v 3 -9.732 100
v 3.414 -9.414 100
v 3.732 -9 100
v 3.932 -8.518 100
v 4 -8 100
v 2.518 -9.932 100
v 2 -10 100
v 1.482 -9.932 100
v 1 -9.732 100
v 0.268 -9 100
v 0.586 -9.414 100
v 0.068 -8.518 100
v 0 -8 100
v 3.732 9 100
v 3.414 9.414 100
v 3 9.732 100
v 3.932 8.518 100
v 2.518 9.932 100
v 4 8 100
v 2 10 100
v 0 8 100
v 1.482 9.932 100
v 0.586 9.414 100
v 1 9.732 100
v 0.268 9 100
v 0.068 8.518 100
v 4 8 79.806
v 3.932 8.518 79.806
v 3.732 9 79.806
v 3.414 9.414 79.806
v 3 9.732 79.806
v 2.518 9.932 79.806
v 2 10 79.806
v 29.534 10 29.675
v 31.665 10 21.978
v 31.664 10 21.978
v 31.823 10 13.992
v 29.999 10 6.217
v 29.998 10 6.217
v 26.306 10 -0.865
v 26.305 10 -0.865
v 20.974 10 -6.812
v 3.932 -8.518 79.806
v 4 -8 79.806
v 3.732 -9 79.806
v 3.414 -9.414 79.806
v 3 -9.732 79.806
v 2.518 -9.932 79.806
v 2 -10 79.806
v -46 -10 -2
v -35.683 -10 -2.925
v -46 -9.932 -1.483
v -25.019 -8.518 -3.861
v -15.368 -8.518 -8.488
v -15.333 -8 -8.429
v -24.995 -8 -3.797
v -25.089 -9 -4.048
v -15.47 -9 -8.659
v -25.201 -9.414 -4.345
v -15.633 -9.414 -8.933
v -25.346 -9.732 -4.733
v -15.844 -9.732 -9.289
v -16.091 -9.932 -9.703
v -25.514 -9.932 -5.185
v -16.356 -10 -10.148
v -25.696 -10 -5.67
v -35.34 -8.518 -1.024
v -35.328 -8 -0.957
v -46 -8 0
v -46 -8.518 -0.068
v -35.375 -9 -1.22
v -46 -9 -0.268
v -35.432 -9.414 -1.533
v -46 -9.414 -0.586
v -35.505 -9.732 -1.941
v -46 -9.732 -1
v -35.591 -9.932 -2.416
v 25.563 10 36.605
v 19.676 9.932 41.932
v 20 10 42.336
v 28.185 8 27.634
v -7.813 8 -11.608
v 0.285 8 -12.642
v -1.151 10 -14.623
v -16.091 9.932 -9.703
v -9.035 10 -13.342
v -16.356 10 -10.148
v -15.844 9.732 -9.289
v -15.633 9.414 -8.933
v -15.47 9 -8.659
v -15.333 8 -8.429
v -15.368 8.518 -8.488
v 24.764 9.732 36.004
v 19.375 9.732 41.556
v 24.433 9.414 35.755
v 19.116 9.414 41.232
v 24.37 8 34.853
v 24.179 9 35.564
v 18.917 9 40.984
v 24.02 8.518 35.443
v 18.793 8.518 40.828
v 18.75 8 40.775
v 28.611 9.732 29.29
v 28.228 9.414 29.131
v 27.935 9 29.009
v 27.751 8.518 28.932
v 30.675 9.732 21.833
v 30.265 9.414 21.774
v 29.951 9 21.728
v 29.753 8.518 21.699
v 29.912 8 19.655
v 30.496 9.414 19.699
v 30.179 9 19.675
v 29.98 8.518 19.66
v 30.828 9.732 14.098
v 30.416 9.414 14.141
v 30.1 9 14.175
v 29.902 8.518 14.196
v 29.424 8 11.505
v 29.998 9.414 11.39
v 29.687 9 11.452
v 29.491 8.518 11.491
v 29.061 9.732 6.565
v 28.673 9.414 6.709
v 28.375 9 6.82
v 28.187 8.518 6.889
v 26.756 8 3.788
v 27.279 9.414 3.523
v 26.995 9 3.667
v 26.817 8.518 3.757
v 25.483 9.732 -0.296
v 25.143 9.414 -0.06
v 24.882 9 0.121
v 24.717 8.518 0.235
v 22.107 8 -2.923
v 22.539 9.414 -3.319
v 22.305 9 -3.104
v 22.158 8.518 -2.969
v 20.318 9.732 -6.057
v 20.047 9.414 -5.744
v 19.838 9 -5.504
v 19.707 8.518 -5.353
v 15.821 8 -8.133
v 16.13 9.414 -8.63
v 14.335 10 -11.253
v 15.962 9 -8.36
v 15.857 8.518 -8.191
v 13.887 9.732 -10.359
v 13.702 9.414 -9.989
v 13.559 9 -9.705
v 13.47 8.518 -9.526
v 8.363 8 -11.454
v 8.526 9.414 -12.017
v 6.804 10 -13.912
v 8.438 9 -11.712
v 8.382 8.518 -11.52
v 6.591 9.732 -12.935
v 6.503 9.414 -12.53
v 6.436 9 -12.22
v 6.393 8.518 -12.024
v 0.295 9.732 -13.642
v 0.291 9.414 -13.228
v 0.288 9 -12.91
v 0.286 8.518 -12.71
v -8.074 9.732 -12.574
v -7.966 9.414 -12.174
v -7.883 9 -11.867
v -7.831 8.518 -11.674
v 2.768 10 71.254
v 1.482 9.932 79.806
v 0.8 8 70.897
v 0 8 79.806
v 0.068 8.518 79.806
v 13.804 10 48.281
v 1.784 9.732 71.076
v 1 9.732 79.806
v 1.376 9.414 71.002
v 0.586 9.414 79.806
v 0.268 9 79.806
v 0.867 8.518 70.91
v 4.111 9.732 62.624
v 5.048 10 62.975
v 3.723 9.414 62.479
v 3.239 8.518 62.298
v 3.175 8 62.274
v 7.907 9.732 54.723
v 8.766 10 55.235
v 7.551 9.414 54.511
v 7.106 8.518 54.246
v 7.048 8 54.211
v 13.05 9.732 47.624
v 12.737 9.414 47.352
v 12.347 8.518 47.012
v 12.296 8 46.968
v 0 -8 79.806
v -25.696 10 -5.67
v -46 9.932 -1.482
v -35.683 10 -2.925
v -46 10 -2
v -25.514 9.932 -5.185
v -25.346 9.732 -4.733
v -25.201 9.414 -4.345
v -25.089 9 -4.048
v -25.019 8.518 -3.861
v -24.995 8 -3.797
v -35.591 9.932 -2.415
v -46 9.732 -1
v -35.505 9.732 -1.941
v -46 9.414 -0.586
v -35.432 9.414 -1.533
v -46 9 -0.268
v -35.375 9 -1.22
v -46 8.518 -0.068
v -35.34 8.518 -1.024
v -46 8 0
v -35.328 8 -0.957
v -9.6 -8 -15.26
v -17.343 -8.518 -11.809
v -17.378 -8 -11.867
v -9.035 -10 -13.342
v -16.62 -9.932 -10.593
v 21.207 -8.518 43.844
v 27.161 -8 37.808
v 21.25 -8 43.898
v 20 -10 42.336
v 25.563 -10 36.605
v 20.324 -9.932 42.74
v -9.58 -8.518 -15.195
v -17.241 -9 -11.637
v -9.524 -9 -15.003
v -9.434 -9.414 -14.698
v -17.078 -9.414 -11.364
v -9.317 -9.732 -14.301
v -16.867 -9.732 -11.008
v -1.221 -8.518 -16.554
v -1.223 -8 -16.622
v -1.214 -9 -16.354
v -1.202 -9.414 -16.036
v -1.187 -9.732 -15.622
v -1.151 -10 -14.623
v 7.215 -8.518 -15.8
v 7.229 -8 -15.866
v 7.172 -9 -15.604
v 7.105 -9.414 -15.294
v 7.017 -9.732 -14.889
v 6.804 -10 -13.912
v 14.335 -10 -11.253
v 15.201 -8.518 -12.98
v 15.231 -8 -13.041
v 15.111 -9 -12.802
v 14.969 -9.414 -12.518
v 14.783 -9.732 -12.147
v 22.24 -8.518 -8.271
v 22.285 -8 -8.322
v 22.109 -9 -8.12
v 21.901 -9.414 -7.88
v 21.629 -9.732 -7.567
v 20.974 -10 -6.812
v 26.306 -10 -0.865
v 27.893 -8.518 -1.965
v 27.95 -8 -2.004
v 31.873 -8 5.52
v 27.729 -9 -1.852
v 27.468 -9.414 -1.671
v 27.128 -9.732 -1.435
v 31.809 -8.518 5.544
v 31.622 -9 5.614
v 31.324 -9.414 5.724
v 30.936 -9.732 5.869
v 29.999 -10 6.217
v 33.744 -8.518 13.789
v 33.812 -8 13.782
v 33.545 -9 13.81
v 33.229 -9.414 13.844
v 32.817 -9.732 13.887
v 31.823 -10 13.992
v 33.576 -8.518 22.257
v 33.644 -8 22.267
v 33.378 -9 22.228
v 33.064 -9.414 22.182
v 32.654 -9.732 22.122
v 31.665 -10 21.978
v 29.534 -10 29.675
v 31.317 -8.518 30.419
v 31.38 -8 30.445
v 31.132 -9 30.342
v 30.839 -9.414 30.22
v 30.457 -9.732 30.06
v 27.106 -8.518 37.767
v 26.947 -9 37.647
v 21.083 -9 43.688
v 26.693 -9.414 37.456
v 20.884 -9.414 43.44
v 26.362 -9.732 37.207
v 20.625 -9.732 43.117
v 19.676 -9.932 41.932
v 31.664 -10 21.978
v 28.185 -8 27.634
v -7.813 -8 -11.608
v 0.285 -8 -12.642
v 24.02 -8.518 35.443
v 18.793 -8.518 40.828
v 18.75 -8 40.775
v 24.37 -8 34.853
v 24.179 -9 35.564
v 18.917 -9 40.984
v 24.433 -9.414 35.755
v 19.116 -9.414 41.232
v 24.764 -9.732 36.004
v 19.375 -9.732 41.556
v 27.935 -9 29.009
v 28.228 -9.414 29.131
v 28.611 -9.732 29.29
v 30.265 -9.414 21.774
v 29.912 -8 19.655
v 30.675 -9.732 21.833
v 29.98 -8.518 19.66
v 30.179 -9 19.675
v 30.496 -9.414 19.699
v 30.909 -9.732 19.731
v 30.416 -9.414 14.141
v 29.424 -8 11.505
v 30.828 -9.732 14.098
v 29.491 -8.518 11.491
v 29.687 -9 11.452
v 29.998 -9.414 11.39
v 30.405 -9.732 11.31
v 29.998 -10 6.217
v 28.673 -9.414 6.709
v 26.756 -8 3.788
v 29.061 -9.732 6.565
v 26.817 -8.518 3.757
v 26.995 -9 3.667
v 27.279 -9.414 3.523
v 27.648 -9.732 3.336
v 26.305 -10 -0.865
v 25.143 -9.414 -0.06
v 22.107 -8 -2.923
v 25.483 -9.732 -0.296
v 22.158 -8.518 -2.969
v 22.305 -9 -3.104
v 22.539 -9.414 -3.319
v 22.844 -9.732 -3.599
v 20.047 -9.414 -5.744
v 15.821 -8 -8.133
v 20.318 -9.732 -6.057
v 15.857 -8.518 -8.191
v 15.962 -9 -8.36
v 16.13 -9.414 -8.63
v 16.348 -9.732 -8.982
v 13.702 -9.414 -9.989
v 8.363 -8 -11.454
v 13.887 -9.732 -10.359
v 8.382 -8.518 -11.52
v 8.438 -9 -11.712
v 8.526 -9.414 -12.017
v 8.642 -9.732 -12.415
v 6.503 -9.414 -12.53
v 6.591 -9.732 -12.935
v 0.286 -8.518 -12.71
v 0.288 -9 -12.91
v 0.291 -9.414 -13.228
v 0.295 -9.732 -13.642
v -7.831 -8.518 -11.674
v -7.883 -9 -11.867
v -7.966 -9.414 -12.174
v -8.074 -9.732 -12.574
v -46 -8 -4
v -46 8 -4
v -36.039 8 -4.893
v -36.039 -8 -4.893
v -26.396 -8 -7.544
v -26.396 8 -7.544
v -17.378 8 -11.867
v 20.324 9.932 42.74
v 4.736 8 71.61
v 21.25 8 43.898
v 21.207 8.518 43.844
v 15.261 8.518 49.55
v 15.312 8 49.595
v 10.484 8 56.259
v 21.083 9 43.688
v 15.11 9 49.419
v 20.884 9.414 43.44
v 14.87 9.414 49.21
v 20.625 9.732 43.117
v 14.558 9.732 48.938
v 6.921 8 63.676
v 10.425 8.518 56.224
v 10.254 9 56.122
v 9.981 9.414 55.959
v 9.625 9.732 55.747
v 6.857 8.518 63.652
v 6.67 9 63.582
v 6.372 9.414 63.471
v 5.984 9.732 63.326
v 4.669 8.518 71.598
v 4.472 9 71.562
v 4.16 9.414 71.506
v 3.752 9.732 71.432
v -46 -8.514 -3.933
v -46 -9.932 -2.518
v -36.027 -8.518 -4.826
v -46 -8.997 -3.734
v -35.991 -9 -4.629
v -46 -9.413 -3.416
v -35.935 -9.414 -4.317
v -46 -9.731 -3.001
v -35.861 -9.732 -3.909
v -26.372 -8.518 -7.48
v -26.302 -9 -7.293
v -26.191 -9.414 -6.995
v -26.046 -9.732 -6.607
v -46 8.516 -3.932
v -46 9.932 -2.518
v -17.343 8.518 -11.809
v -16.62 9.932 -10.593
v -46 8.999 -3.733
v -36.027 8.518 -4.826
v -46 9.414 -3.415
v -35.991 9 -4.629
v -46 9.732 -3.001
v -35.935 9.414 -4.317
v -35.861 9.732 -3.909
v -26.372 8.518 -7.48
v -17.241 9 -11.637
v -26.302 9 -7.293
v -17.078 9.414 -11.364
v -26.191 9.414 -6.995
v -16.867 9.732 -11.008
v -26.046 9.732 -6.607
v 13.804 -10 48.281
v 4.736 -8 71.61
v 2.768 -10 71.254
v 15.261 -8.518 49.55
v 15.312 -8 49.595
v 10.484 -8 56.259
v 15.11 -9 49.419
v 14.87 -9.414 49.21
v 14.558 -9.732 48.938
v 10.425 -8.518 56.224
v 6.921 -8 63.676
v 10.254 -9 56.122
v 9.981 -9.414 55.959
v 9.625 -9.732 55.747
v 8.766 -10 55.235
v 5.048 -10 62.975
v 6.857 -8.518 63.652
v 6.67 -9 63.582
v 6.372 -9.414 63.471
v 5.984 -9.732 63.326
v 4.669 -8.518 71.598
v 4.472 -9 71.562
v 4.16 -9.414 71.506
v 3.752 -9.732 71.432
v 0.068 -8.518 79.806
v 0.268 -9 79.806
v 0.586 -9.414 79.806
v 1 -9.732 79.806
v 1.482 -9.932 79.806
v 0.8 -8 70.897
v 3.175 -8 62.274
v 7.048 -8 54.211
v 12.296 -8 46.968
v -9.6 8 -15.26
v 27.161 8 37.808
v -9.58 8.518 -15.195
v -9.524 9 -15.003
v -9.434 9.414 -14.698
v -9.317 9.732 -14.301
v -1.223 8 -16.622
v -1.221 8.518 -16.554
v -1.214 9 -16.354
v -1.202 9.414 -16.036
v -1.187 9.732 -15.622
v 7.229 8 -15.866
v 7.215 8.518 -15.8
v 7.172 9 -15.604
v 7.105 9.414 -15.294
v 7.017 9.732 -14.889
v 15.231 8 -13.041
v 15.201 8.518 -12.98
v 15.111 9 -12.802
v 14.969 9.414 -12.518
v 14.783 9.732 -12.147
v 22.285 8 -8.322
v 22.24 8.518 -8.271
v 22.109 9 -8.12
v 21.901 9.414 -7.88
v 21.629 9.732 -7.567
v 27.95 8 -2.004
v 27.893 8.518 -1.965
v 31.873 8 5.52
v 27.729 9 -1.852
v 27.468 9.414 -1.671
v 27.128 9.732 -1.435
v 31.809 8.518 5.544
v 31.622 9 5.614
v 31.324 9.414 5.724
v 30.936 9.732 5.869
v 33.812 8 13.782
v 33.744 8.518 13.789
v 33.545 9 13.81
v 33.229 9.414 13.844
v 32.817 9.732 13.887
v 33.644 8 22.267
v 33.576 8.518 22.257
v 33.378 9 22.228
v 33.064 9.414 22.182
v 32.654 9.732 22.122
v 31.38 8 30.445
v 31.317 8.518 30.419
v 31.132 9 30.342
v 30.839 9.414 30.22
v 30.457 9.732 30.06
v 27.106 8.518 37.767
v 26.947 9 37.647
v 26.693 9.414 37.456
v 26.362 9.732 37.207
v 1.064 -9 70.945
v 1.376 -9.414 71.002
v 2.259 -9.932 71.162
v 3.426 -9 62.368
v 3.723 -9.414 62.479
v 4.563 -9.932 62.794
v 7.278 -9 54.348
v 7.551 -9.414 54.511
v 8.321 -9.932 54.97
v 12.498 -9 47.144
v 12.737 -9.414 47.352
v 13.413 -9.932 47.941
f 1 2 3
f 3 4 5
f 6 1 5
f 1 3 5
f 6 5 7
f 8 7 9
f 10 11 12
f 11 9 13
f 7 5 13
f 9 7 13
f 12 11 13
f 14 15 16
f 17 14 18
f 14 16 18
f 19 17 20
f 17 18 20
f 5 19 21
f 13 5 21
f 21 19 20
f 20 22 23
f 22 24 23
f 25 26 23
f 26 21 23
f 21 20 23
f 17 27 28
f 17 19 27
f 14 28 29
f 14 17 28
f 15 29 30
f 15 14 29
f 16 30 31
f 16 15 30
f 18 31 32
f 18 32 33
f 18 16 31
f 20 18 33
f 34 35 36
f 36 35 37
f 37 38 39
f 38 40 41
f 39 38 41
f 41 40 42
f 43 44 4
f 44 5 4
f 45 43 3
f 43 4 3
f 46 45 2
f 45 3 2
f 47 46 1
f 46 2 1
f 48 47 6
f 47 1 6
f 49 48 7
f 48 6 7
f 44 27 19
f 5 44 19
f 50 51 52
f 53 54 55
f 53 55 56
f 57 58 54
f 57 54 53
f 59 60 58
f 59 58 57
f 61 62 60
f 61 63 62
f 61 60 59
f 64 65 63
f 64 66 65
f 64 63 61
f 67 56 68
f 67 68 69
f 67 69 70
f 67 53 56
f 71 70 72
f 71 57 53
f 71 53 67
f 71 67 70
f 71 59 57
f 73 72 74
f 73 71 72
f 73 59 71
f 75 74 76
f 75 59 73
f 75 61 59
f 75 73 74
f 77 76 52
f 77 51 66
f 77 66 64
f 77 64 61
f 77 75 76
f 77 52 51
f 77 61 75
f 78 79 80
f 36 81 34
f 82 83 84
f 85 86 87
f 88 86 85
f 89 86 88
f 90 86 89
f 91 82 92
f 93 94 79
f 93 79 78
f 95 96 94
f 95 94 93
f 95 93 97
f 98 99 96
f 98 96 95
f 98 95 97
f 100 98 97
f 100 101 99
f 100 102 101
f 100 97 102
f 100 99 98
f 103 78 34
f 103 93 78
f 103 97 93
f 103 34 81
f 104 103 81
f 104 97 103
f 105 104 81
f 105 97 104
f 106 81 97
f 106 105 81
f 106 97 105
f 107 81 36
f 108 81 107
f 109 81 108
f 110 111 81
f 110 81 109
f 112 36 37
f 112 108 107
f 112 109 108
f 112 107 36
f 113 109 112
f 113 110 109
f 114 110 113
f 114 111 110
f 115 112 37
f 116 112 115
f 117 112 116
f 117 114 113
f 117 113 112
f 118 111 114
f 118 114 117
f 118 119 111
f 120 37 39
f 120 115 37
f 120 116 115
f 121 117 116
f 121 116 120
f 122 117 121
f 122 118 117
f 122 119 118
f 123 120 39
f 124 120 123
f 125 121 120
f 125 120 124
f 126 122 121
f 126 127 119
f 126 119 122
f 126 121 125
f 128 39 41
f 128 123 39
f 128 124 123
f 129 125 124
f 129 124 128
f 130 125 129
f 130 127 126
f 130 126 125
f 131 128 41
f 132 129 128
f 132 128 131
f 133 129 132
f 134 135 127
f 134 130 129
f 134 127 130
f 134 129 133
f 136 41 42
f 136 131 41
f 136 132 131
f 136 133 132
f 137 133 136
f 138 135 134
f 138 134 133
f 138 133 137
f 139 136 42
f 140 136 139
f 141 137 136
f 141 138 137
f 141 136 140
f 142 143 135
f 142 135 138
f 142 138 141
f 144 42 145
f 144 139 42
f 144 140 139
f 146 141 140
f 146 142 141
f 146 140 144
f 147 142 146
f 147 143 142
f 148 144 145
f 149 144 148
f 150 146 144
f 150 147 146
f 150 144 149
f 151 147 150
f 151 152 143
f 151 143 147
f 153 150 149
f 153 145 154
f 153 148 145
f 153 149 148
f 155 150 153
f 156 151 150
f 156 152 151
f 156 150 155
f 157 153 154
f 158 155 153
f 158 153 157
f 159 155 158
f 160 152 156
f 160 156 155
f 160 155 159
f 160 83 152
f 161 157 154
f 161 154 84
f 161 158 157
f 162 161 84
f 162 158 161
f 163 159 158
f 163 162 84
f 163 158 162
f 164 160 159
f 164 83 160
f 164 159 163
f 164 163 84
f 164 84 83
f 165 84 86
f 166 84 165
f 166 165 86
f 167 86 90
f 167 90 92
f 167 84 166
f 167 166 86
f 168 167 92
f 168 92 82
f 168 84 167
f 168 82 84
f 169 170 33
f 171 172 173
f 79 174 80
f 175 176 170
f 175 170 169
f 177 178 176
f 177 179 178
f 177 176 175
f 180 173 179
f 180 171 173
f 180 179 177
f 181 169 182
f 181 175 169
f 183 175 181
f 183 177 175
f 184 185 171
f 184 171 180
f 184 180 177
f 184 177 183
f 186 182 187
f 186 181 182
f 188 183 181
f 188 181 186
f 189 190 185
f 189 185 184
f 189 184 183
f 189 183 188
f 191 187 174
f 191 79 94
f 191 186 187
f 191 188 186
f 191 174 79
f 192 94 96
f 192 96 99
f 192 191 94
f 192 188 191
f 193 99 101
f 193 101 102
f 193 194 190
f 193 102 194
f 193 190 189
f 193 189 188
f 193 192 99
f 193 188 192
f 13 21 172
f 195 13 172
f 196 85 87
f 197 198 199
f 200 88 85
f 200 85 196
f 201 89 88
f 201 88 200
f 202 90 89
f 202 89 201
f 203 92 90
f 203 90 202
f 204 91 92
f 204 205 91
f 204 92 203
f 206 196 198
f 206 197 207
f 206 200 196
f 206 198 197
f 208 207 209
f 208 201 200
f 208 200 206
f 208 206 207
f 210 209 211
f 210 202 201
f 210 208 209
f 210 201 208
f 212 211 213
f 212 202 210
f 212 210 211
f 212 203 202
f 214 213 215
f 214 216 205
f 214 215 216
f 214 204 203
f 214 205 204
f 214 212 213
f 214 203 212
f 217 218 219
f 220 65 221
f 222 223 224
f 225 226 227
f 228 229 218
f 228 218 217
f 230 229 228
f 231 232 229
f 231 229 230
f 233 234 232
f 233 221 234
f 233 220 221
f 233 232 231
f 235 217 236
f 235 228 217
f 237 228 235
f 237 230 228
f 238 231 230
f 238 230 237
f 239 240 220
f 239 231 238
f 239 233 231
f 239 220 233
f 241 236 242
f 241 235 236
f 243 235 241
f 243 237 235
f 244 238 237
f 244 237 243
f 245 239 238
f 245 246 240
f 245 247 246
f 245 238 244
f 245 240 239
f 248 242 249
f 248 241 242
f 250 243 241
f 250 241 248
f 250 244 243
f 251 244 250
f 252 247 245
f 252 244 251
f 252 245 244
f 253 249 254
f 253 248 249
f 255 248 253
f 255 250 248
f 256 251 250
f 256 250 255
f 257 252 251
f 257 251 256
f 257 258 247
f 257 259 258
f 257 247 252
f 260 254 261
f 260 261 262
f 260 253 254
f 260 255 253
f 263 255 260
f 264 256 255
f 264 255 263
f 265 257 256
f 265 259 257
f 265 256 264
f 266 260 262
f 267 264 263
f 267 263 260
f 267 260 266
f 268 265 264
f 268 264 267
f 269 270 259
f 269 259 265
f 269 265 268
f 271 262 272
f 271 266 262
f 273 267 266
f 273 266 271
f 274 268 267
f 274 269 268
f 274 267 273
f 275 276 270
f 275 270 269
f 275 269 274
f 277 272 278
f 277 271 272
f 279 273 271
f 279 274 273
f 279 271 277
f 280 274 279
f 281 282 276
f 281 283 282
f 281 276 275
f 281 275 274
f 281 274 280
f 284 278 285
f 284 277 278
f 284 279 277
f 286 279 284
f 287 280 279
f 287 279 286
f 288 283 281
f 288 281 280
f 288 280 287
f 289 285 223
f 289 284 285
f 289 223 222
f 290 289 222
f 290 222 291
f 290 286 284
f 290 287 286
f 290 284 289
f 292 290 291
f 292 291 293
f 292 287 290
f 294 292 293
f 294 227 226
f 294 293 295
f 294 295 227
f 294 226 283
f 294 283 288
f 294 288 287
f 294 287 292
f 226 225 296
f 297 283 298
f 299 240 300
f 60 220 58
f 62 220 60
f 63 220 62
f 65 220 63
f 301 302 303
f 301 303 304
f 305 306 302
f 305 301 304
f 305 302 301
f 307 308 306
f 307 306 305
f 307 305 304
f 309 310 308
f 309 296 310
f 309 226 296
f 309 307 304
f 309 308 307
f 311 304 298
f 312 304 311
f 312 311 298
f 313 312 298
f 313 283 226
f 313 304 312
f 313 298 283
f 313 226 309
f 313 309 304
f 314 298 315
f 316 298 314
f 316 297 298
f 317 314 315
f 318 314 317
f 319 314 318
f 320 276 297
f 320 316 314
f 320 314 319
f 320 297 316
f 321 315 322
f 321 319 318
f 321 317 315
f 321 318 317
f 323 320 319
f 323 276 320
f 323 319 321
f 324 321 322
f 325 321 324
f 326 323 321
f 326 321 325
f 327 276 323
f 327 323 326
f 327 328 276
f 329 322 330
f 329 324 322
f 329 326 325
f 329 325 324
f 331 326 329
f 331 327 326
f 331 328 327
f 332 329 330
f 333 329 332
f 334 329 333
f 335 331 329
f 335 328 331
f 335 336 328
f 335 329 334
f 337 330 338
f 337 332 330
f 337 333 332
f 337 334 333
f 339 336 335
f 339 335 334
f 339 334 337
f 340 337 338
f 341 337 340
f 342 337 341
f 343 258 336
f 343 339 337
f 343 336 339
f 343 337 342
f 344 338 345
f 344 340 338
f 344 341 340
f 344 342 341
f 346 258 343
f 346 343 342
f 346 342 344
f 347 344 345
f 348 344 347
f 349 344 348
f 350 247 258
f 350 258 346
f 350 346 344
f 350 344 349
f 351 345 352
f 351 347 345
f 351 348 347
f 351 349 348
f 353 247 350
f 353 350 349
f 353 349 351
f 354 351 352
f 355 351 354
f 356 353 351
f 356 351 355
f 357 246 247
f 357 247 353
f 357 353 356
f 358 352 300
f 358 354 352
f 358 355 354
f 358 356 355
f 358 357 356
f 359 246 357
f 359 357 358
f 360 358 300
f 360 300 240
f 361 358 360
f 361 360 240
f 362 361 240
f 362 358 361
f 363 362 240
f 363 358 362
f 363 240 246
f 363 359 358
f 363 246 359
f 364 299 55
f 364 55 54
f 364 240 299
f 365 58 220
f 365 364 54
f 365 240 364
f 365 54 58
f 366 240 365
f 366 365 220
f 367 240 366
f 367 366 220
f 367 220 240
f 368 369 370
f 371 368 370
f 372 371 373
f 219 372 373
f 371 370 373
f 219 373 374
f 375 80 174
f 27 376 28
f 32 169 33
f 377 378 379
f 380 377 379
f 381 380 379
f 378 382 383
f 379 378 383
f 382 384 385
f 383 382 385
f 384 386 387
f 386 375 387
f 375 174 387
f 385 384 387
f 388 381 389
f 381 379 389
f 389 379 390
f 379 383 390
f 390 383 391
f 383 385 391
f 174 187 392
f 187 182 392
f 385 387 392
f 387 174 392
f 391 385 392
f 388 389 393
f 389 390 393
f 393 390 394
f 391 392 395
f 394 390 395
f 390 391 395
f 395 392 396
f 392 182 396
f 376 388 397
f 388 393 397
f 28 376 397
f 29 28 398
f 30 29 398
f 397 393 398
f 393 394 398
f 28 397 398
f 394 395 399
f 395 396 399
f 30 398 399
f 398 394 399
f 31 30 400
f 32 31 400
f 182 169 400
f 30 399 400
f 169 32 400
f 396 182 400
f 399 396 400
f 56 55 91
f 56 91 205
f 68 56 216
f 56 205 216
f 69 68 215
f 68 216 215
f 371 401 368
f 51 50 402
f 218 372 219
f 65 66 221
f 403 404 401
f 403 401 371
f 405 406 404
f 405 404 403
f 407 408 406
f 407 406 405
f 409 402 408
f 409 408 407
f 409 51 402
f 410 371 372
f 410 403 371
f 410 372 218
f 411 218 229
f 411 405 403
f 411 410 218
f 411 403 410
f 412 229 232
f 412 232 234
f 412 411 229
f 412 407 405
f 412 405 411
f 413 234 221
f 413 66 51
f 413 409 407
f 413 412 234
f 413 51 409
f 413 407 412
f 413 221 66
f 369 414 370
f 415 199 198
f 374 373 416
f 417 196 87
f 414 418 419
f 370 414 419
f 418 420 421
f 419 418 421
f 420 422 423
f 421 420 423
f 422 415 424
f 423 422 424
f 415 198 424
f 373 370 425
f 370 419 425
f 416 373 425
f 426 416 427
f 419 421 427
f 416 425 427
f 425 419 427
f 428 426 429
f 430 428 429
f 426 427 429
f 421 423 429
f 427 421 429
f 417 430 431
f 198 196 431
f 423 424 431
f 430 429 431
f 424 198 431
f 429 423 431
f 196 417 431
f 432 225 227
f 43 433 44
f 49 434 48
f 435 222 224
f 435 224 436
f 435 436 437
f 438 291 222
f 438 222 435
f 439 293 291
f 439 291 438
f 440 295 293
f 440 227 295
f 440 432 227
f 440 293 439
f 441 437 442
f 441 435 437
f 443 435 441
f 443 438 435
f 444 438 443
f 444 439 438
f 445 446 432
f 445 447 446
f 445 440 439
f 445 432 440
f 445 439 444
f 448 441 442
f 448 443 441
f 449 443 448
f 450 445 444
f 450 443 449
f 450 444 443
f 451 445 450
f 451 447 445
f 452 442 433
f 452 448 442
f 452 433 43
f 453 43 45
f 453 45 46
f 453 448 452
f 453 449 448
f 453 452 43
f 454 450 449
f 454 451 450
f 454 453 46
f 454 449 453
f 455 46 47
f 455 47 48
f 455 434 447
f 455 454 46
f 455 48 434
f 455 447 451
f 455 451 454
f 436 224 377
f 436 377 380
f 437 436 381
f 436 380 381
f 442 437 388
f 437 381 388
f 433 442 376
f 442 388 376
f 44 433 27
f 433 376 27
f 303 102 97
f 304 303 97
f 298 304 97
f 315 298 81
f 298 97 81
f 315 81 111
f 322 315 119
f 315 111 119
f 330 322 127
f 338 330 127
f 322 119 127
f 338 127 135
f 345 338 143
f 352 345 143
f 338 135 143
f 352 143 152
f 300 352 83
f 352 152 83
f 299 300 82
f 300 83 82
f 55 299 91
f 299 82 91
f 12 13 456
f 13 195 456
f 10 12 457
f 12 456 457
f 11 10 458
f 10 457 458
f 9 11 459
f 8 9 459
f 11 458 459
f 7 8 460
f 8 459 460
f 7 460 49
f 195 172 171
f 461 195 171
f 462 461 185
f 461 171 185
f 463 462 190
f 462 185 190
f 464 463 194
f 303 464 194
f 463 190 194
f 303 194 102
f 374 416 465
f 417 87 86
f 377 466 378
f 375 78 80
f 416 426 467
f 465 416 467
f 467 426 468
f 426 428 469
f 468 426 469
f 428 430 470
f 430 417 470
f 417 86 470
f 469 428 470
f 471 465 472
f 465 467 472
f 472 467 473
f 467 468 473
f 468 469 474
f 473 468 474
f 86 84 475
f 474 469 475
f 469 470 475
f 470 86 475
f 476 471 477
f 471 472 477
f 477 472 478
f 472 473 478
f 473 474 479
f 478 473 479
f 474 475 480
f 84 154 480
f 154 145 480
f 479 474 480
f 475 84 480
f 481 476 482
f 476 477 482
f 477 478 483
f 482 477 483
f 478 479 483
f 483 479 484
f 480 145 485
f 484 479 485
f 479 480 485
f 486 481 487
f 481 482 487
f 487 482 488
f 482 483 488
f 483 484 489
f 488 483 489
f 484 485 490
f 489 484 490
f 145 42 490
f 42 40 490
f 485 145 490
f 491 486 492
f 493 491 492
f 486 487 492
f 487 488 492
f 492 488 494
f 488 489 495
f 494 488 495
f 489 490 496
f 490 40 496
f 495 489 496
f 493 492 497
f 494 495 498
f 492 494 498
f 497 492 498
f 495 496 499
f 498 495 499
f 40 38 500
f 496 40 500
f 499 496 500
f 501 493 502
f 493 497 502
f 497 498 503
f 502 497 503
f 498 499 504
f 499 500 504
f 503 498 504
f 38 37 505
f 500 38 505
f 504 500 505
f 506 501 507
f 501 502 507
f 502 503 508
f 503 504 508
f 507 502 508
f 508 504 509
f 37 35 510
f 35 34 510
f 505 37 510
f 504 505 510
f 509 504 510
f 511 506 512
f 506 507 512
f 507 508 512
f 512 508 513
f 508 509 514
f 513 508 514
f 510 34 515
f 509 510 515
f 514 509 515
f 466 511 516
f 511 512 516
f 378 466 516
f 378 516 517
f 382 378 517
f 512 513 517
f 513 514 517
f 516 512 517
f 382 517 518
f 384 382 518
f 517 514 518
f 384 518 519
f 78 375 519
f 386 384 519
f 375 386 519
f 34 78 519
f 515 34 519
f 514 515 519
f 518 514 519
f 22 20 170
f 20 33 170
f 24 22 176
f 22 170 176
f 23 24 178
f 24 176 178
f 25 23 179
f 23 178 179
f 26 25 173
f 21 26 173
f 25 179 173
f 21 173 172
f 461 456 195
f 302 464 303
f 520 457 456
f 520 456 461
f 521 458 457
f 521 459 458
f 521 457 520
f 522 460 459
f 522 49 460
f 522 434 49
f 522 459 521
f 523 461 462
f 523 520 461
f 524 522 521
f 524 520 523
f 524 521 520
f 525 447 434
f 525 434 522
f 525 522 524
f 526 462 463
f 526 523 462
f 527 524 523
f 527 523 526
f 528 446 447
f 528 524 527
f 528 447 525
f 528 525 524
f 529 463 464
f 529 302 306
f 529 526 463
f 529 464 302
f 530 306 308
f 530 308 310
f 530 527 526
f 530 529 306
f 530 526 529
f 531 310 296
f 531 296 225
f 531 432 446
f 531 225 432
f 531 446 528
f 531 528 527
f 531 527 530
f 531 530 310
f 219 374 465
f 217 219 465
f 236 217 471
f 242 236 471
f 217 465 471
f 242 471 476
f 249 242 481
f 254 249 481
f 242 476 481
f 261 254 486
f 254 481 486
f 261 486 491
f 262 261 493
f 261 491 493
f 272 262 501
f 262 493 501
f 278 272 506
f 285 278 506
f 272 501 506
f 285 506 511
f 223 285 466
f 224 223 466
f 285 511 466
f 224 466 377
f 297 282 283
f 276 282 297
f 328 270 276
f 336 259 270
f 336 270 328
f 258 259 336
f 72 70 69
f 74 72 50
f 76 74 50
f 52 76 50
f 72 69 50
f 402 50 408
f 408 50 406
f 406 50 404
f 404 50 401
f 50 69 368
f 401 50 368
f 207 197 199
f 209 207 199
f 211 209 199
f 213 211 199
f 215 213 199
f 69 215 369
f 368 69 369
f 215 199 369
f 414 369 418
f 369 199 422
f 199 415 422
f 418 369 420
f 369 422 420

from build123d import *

# Parameters (mm, degrees)
BOSS_EXTRUDE1_DEPTH = 10
FILLET1_R           = 2


with BuildPart() as part:
    # Sketch1 → Boss-Extrude1 (new, symmetric)
    with BuildSketch(Plane(origin=(0, 0, 0), x_dir=(1, 0, 0), z_dir=(0, 1, 0))):
        with BuildLine():
            Line((4, -79.806298407), (4, -100))
            Line((4, -100), (0, -100))
            Line((0, -100), (0, -79.806298407))
            ThreePointArc((0, -79.806298407), (4.930609057, -58.155663313), (18.75, -40.775060917))
            ThreePointArc((18.75, -40.775060917), (24.661331748, -0.273616166), (-15.333333333, 8.429121051))
            ThreePointArc((-15.333333333, 8.429121051), (-30.097999134, 2.145645207), (-46, 0))
            Line((-46, 0), (-46, 4))
            ThreePointArc((-46, 4), (-31.158132525, 6.002602194), (-17.377777778, 11.867179648))
            ThreePointArc((-17.377777778, 11.867179648), (27.949509314, 2.004077469), (21.25, -43.897559916))
            ThreePointArc((21.25, -43.897559916), (8.536160332, -59.88771412), (4, -79.806298407))
        make_face()
    extrude(amount=BOSS_EXTRUDE1_DEPTH, both=True)

    # Fillet1
    fillet1_edges = [part.edges().sort_by_distance(p)[0] for p in [
        (0, -10, 89.903149204),
        (4.930609057, -10, 58.155663313),
        (24.661331748, -10, 0.273616166),
        (4, -10, 89.903149204),
        (8.536160332, -10, 59.88771412),
        (27.949509314, -10, -2.004077469),
        (0, 10, 89.903149204),
        (4.930609057, 10, 58.155663313),
        (24.661331748, 10, 0.273616166),
        (4, 10, 89.903149204),
        (8.536160332, 10, 59.88771412),
        (27.949509314, 10, -2.004077469),
        (-30.097999134, -10, -2.145645207),
        (-31.158132525, -10, -6.002602194),
        (-30.097999134, 10, -2.145645207),
        (-31.158132525, 10, -6.002602194),
    ]]
    fillet(fillet1_edges, radius=FILLET1_R - 0.0001)  # a hair under: the kernel refuses the full size


solid = part.part
